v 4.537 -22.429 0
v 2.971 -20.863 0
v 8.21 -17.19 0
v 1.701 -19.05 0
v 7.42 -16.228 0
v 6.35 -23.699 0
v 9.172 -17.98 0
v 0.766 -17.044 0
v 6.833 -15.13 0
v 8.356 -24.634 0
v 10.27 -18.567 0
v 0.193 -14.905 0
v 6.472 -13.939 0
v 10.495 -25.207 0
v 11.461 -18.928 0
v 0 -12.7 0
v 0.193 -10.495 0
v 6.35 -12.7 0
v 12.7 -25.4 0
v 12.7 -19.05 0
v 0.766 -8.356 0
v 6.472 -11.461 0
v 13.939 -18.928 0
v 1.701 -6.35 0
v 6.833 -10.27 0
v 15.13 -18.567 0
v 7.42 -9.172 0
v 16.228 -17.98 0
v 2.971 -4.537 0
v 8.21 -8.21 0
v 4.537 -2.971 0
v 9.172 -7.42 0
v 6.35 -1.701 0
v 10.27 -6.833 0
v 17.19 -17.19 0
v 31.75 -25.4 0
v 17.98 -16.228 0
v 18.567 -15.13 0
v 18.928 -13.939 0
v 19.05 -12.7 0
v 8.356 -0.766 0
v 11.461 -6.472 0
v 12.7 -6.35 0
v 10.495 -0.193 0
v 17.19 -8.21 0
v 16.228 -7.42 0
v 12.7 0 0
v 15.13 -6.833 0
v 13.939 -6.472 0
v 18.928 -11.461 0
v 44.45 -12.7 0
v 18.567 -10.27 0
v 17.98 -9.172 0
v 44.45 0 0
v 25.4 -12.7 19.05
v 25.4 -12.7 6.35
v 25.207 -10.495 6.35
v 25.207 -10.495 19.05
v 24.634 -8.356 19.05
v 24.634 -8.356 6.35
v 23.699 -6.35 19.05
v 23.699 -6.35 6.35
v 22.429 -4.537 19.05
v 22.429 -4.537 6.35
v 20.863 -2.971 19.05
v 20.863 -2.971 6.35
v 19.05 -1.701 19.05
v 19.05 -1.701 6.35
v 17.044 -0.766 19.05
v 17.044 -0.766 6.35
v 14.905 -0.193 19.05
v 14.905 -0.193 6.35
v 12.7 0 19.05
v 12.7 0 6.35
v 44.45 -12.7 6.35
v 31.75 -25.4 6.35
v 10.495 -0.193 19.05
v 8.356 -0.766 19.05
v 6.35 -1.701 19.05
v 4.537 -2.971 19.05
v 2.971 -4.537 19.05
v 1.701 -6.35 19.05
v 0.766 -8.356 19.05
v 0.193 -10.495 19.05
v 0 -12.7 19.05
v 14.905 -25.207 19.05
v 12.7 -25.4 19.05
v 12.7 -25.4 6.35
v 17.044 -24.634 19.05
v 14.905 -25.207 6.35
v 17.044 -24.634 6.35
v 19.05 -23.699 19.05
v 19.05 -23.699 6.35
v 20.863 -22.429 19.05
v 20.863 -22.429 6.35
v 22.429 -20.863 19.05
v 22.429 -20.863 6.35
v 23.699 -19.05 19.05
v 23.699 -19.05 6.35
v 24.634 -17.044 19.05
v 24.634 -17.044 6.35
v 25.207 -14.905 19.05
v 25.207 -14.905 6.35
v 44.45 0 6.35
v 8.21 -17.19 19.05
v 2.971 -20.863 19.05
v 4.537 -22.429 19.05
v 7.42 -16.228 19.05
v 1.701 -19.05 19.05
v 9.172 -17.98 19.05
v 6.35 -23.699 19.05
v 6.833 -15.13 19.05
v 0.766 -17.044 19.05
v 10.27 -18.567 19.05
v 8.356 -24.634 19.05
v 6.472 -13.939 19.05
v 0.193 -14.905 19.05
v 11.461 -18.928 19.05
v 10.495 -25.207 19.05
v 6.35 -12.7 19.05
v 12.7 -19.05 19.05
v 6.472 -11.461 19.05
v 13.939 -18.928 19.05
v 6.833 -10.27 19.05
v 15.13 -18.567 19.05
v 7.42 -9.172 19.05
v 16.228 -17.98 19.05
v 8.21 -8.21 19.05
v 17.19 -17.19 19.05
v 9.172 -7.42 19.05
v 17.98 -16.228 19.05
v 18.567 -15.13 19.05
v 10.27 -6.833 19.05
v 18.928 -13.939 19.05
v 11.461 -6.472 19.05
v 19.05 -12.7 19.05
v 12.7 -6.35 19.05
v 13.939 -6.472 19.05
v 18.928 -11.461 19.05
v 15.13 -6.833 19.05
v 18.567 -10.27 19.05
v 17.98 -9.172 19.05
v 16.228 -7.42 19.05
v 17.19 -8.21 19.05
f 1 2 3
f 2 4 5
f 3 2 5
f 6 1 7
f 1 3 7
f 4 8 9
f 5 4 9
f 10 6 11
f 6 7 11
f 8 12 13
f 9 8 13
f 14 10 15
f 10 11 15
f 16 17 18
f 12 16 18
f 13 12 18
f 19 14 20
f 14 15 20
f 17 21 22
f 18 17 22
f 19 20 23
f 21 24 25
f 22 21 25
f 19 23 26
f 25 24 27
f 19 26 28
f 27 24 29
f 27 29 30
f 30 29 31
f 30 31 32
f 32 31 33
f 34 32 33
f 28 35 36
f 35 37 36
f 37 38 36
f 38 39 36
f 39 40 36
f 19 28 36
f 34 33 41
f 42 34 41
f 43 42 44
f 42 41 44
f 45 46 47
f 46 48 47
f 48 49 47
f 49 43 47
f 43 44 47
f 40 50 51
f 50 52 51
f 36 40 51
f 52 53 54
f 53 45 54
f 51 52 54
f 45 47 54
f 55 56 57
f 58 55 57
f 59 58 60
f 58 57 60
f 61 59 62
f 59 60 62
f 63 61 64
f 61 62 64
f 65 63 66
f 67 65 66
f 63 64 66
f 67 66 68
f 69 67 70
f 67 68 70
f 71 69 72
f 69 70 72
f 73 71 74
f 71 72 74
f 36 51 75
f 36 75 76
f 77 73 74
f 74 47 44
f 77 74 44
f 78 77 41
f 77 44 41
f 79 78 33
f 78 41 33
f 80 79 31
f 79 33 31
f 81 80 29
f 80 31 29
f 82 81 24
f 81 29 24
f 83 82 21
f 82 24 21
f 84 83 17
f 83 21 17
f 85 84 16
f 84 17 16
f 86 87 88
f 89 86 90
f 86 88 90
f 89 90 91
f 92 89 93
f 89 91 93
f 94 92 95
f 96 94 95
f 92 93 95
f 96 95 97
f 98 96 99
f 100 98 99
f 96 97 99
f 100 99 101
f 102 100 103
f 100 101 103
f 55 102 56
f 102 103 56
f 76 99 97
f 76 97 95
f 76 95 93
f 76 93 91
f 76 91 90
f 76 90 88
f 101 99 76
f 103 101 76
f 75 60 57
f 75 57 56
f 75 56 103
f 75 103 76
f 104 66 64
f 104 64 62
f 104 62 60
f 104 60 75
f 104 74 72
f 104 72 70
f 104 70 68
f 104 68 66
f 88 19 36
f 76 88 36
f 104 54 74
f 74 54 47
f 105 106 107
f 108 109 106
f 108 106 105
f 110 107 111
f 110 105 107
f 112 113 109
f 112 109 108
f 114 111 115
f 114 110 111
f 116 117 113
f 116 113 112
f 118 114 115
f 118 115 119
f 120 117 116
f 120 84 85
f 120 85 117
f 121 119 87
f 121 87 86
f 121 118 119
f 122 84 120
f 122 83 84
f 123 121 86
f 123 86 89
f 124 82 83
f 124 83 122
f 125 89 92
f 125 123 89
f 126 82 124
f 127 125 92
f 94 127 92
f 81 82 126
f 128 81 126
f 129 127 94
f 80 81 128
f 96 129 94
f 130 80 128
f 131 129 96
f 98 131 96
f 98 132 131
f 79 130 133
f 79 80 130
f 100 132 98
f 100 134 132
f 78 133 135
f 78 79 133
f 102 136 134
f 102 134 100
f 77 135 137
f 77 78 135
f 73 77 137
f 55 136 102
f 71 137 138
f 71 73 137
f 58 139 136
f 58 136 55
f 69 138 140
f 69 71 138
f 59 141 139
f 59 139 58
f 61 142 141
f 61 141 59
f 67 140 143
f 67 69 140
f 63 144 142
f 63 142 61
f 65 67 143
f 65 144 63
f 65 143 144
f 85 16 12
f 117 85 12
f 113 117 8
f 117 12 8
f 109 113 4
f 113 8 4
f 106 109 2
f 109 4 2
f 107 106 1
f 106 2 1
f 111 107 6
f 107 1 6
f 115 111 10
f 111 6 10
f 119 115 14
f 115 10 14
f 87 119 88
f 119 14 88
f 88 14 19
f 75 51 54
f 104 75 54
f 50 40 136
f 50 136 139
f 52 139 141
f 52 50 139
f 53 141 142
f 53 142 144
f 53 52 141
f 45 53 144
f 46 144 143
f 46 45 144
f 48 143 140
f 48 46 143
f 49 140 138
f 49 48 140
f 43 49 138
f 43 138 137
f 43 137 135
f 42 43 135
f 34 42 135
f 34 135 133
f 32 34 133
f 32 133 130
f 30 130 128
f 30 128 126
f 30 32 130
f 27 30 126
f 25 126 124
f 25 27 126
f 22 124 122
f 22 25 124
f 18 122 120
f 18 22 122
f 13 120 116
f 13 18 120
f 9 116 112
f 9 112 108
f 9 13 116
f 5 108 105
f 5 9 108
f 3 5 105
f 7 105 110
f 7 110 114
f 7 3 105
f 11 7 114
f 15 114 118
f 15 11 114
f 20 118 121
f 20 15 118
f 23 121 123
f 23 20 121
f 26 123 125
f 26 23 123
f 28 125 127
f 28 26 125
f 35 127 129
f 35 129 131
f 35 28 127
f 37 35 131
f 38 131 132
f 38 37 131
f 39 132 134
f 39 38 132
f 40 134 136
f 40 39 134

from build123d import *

# Parameters (mm, degrees)
F1_DEPTH = 6.35
F0_R     = 6.35
F2_DEPTH = 19.05
F4_DEPTH = 19.051


with BuildPart() as f1:
    # F0 (on Top) → F1 (new body)
    with BuildSketch(Plane.XY):
        with BuildLine():
            Line((44.45, 0), (12.7, 0))
            ThreePointArc((12.7, 0), (21.680256, -3.719744), (25.4, -12.7))
            ThreePointArc((25.4, -12.7), (21.680256, -21.680256), (12.7, -25.4))
            Line((12.7, -25.4), (44.45, -25.4))
            Line((44.45, -25.4), (44.45, 0))
        make_face()
    extrude(amount=F1_DEPTH)

    # F0 (on Top) → F2 (join)
    with BuildSketch(Plane.XY):
        with BuildLine():
            ThreePointArc((25.4, -12.7), (21.680256, -3.719744), (12.7, 0))
            ThreePointArc((12.7, 0), (3.719744, -3.719744), (0, -12.7))
            ThreePointArc((0, -12.7), (3.719744, -21.680256), (12.7, -25.4))
            ThreePointArc((12.7, -25.4), (21.680256, -21.680256), (25.4, -12.7))
        make_face()
        with Locations((12.7, -12.7)):
            Circle(F0_R, mode=Mode.SUBTRACT)
    extrude(amount=F2_DEPTH)

    # F3 (on Top) → F4 (cut, through all)
    with BuildSketch(Plane.XY):
        Polygon((44.45, -12.7), (31.75, -25.4), (44.45, -25.4), align=None)
    extrude(amount=F4_DEPTH, mode=Mode.SUBTRACT)


solid = f1.part
